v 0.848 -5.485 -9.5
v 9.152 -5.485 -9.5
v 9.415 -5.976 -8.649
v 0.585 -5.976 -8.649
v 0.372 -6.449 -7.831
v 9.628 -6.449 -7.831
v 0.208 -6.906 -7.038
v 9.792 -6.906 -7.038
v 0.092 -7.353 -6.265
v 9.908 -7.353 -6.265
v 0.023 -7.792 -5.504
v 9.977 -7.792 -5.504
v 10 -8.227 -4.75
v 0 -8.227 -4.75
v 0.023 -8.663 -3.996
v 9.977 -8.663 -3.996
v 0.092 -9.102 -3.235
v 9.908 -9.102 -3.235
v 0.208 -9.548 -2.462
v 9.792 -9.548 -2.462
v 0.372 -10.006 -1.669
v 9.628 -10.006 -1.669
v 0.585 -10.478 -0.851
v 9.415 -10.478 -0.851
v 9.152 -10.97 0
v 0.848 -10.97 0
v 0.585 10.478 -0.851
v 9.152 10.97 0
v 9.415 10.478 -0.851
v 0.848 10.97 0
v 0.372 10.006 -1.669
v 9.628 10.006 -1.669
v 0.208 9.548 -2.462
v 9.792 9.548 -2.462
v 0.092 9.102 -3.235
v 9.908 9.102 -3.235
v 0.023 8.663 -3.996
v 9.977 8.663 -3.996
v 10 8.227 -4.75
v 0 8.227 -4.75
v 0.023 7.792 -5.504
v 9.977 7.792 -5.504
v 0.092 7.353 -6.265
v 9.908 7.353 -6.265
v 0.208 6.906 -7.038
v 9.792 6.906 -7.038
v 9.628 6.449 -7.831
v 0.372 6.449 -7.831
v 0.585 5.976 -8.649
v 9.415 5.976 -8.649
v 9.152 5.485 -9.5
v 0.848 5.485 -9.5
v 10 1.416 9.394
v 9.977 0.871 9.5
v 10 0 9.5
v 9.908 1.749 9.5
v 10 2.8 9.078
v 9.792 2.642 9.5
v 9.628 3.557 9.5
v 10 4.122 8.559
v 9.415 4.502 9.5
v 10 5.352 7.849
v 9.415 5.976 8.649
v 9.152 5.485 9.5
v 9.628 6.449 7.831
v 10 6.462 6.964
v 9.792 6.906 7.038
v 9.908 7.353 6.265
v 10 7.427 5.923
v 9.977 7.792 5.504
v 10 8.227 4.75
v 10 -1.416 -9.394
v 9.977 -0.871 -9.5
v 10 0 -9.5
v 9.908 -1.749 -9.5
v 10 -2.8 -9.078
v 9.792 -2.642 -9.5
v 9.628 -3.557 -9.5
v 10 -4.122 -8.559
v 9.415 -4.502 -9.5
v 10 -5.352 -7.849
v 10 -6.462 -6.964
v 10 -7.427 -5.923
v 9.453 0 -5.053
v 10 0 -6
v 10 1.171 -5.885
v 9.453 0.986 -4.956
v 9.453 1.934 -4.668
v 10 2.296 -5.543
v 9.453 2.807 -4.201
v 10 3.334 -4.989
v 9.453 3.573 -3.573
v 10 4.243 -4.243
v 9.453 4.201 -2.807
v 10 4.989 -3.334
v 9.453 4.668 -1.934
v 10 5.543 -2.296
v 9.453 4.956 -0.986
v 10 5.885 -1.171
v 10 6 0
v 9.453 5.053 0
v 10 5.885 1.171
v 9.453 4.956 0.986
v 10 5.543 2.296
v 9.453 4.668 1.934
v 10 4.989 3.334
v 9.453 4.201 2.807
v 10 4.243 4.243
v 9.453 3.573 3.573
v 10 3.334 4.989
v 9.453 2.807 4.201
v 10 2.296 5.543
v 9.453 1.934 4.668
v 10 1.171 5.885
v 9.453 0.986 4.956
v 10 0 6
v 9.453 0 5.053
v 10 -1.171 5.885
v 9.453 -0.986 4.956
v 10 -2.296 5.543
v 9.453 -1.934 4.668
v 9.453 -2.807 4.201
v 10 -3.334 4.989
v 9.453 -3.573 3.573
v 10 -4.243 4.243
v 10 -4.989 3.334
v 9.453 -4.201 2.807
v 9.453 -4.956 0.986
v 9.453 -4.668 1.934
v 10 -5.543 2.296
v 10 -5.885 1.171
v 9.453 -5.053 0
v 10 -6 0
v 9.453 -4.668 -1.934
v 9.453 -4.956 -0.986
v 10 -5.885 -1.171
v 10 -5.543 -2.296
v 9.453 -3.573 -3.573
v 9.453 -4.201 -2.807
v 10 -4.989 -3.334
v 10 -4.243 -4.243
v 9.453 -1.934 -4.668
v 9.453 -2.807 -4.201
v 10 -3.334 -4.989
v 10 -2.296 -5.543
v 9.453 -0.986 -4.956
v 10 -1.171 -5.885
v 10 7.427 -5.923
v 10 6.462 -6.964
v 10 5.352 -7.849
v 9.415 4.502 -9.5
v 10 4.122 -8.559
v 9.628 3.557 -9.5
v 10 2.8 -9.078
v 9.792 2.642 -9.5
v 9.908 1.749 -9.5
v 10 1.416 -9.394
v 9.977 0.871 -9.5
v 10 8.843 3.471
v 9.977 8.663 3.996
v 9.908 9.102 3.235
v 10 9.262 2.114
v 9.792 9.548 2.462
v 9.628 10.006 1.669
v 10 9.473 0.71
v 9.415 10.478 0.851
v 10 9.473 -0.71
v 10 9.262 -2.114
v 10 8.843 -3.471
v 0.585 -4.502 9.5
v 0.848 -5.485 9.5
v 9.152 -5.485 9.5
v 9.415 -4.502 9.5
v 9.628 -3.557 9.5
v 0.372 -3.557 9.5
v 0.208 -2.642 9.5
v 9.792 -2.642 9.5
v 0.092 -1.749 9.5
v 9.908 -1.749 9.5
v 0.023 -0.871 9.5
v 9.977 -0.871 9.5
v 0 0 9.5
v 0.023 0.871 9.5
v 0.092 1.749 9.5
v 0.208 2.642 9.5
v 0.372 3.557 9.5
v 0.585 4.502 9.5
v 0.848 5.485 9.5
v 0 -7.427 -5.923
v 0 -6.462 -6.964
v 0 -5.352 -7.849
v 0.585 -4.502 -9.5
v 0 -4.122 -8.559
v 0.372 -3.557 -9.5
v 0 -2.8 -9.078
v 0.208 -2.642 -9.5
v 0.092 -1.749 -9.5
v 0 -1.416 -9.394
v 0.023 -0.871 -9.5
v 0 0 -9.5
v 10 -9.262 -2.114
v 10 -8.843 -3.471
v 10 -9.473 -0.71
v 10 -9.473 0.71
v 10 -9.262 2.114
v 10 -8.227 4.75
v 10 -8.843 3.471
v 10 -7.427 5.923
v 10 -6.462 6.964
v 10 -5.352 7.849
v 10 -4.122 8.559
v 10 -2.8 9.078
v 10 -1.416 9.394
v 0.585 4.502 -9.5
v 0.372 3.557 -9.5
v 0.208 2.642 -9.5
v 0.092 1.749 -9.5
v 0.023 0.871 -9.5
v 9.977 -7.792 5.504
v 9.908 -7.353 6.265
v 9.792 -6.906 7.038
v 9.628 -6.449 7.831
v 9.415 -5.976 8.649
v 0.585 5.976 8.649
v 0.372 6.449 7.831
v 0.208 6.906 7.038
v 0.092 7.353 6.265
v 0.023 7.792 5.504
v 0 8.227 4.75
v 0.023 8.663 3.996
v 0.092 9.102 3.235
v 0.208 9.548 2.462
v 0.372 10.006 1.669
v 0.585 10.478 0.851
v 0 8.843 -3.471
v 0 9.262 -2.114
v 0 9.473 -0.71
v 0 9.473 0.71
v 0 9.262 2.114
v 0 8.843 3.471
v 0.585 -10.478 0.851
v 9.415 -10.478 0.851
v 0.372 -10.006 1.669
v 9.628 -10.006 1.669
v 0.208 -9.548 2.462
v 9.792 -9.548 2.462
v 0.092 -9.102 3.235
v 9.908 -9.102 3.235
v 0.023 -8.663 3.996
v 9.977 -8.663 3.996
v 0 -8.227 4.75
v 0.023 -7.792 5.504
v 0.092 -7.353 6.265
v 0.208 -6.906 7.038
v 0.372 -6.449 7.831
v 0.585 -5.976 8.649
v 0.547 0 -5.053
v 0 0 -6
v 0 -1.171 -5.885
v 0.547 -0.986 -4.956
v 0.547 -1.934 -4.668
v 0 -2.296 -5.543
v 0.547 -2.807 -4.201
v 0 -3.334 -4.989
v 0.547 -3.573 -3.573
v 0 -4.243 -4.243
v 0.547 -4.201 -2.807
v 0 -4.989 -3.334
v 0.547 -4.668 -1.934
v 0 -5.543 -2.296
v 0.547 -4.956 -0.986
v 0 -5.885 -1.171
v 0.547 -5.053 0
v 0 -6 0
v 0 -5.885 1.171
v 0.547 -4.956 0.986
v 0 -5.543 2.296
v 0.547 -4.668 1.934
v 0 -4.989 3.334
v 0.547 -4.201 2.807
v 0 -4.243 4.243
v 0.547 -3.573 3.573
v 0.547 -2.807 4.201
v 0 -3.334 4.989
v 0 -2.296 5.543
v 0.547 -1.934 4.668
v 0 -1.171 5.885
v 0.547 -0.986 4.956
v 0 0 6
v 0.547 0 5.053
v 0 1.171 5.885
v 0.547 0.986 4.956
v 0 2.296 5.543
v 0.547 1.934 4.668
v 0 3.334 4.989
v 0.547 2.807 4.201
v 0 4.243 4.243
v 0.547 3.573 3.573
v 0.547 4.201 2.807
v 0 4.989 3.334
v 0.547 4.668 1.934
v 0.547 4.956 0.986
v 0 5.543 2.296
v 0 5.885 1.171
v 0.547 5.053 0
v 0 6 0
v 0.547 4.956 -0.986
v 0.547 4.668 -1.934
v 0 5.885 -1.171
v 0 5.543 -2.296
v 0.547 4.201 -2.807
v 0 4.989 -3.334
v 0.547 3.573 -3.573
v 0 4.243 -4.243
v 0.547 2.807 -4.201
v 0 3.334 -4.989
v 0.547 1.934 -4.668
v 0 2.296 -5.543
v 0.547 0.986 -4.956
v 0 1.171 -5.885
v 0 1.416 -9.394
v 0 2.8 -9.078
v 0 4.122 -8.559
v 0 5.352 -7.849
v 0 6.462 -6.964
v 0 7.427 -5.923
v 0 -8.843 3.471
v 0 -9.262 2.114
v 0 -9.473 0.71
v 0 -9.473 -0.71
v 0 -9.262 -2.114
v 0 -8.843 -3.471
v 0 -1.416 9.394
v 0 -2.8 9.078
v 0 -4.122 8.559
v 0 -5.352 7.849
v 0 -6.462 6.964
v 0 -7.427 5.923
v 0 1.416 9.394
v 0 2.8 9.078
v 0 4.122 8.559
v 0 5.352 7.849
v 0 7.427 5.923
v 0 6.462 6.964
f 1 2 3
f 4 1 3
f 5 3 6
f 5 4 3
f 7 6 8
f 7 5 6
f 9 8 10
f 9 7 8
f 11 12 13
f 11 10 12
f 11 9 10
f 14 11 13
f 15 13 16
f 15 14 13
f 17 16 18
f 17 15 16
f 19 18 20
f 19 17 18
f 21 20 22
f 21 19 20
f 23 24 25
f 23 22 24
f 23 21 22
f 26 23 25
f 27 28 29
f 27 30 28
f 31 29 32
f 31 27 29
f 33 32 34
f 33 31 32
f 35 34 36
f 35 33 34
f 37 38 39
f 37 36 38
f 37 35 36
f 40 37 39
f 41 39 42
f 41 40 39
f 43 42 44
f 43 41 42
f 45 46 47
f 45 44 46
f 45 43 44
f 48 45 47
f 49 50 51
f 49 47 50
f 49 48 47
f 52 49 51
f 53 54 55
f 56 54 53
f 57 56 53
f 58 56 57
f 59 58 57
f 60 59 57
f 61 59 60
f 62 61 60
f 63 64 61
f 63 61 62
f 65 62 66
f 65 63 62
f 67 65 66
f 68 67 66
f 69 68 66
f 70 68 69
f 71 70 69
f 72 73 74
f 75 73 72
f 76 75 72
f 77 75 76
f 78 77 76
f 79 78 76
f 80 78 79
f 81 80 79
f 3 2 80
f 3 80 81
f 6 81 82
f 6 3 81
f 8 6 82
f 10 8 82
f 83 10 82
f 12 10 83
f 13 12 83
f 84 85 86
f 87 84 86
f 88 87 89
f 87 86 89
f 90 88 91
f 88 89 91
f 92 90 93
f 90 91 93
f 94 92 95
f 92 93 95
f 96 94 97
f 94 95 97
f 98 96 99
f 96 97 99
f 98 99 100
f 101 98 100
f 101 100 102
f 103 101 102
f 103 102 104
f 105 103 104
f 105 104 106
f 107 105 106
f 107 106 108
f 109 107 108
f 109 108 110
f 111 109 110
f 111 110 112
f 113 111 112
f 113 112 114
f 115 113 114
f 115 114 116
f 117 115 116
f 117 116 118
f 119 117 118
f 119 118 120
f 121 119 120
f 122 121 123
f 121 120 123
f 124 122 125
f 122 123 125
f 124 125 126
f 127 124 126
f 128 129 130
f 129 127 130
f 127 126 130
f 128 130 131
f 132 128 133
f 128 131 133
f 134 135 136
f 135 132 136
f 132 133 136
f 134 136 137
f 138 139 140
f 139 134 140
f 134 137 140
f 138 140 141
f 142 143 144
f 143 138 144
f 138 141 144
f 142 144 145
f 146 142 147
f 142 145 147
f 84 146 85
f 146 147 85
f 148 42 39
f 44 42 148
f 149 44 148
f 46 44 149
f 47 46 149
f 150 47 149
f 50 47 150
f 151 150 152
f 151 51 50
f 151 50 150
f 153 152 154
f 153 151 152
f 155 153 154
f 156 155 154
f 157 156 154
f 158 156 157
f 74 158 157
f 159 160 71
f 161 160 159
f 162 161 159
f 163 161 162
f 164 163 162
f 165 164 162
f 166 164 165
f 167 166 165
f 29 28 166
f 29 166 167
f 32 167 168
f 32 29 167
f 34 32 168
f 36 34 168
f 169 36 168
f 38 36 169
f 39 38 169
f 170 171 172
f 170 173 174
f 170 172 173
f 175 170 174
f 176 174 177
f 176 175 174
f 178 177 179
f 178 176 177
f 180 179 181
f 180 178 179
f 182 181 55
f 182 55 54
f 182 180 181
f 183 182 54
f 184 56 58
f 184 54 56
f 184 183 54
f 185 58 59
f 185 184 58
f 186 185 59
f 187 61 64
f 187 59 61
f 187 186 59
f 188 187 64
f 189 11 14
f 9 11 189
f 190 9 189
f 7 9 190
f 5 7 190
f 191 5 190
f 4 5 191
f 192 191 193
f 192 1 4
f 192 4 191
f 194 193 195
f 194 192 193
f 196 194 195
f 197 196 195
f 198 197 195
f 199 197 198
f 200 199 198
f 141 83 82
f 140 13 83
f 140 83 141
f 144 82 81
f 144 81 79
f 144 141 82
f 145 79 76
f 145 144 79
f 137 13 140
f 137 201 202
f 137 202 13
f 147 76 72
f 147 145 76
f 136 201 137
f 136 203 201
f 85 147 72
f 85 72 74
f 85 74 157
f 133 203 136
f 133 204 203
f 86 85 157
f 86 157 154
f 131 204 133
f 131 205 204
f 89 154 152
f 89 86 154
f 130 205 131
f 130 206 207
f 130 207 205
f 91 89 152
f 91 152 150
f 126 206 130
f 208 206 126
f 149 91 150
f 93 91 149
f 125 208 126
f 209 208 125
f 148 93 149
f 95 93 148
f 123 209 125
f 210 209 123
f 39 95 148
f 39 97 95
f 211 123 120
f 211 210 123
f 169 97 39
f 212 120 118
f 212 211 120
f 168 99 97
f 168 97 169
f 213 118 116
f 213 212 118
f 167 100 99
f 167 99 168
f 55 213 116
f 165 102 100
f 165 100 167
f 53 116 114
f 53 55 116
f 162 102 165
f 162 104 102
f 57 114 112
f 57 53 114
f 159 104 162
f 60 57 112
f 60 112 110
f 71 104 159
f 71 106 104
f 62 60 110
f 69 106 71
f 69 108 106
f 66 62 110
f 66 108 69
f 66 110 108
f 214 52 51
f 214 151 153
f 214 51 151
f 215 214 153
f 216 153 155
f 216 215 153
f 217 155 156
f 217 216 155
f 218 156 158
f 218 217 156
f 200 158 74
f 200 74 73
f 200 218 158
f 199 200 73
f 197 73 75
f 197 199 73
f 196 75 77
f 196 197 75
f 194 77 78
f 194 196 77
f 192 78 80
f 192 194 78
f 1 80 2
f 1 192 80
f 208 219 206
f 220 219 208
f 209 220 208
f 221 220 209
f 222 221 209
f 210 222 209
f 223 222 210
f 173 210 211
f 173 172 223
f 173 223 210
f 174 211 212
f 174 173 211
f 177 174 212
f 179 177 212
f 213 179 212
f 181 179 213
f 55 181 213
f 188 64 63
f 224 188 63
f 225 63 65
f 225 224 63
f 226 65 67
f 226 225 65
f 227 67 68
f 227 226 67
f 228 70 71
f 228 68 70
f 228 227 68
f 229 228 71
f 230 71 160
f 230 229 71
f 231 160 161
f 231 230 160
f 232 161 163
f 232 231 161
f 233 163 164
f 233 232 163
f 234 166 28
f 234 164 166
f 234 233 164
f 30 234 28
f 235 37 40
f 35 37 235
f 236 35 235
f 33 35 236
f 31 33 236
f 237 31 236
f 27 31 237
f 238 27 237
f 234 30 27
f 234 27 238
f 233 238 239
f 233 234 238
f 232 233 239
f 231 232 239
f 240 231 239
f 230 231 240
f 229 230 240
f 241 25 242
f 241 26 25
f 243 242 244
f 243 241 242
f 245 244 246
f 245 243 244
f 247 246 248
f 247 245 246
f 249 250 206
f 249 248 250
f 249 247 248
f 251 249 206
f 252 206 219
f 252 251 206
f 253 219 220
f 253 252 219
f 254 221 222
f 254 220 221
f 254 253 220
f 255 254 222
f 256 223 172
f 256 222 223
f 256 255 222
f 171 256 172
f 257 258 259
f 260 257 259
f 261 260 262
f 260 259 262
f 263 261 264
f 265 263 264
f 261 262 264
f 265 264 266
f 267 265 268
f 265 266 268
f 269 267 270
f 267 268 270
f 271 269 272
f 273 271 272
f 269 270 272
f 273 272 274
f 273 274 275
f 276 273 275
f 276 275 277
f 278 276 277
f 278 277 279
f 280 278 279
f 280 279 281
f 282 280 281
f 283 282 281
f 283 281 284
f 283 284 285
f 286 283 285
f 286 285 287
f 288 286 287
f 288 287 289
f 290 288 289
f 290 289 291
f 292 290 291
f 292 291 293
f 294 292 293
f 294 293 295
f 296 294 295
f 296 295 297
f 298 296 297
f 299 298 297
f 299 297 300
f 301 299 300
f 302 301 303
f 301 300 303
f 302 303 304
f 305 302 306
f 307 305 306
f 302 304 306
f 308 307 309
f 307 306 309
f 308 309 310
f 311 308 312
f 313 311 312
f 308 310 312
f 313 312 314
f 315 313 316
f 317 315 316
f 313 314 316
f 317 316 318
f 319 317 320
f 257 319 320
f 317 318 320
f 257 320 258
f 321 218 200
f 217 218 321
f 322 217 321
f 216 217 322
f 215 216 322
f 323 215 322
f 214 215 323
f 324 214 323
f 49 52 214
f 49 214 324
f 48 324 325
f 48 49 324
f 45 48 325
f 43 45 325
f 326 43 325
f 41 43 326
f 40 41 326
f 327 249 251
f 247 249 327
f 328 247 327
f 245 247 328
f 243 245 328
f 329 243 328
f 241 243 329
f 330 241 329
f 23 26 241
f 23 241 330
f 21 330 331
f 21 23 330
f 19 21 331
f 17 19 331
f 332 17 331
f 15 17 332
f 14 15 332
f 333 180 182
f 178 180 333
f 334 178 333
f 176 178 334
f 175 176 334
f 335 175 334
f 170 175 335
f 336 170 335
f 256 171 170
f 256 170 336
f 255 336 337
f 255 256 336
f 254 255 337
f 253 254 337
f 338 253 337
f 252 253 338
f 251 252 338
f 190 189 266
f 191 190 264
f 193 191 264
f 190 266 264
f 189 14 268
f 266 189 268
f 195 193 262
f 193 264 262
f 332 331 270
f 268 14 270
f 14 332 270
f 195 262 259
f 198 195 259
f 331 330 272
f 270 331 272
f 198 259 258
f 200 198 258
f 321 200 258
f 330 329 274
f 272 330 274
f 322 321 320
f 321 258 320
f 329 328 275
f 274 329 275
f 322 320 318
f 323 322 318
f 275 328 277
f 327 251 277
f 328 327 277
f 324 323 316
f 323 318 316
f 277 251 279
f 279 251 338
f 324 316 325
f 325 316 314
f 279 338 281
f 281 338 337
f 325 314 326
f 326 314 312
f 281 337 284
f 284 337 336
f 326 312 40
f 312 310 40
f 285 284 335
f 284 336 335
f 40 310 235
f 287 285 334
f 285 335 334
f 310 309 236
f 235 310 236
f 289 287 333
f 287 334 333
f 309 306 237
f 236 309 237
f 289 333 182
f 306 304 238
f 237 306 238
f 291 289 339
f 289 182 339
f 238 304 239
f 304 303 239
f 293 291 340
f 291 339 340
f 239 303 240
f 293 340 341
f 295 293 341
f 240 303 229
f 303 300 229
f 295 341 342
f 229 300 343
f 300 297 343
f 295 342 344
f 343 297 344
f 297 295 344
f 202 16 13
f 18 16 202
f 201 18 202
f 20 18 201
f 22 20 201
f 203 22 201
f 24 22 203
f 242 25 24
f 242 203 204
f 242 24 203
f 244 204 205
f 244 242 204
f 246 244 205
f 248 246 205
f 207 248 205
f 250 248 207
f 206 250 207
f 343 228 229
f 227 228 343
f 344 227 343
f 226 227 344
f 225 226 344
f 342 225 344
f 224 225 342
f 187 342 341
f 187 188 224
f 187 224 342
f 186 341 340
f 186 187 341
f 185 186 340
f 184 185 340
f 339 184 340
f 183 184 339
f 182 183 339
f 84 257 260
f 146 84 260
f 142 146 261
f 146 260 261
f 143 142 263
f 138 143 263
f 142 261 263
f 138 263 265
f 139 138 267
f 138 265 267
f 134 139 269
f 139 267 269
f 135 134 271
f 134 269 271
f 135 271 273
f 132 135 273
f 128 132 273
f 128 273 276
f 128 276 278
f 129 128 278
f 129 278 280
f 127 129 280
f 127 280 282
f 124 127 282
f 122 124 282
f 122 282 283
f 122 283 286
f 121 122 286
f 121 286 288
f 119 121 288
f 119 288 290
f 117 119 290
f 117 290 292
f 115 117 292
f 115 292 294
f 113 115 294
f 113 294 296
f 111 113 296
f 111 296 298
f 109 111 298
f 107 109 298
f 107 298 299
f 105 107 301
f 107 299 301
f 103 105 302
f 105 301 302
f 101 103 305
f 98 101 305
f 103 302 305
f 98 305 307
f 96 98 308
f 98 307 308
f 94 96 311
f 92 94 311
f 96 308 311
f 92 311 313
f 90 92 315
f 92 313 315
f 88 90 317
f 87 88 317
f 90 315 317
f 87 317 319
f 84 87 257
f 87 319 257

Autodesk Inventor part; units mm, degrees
ref_plane "YZ Plane" through (0, 0, 0) normal (1, 0, 0) x (0, 1, 0)
ref_plane "XZ Plane" through (0, 0, 0) normal (0, 1, 0) x (-1, 0, 0)
sketch "Эскиз1" plane through (0, 0, 0) normal (1, 0, 0) x (0, 1, 0)
  line L0 (-10.9697, 0) -> (-5.4848, 9.5)
  line L1 (-5.4848, 9.5) -> (5.4848, 9.5)
  line L2 (5.4848, 9.5) -> (10.9697, 0)
  line L3 (10.9697, 0) -> (5.4848, -9.5)
  line L4 (5.4848, -9.5) -> (-5.4848, -9.5)
  line L5 (-5.4848, -9.5) -> (-10.9697, 0)
  point P0 (0, 0)
  point P1 (0, 0)
  dimension "d0" = 21.9393
extrude "Базовый элемент" add sketch "Эскиз1" along normal blind 10
sketch "Эскиз2" plane through (0, 0, 0) normal (0, 0, 1) x (1, 0, 0)
  line L0 (0, 5.4848) -> (0, 10.9697) projected
  line L1 (0, 10.9697) -> (10, 10.9697) projected
  line L2 (10, 5.4848) -> (10, 10.9697) projected
  line L3 (-2, 0) -> (12, 0) projected
  line L4 (0.8485, 10.9697) -> (0, 9.5)
  line L5 (9.1515, 10.9697) -> (10, 9.5)
  dimension "d3" = 30
  dimension "d4" = 30
  dimension "d5" = 19
  dimension "d6" = 19
revolve "Фаска1" cut sketch "Эскиз2" angle 360 about axis through (-10, 0, 0) along (1, 0, 0)
sketch "Эскиз3" plane through (10, 0, 0) normal (1, 0, 0) x (0, 0, -1)
  arc A0 (-4.75, -8.2272) -> (4.75, -8.2272) centre (0, 0) ccw projected
hole "Резьба" at (10, 0, 0) direction (-1, 0, 0) diameter 10.106 end through all thread size "M12x1.75" class "6H" standard "ISO Metric profile"
chamfer "Фаска2" distance 0.9472 angle 30 1 edges at (10, 0, 5.053) measured on face at (10, -7.9707, -0.203)
chamfer "Фаска3" distance 0.9472 angle 30 1 edges at (0, 0, 5.053) measured on face at (0, -7.9707, -0.203)
ref_plane "Work Plane1" through (-20.6974, 0, 0) normal (0, -0.866, -0.5) x (1, 0, 0)
equation "\"d0\" = 1.1547 * SW"
equation "\"d1\" = KOH"
equation "\"d3\" = ANG1"
equation "\"d4\" = ANG2"
equation "\"d5\" = SW0"
equation "\"d6\" = SW01"
equation "\"d8\" = -0.5 * GD1 + 0.5 * NND"
equation "\"d40\" = -0.5 * GD1 + 0.5 * NND"
equation "\"d10\" = -0.5 * GD1 + 0.5 * NND"
equation "\"d41\" = -0.5 * GD1 + 0.5 * NND"
equation "\"ANG1\" = 30deg"
equation "\"ANG2\" = 30deg"
equation "\"NND\" = 12"
equation "\"KOH\" = 10"
equation "\"SW\" = 19"
equation "\"SW0\" = 19"
equation "\"SW01\" = SW0"
equation "\"GUL\" = 0.541266 * PTC"
equation "\"LADI\" = 18.05"
equation "\"TOA\" = 30deg"
equation "\"FAWI\" = 30deg"
equation "\"PTC\" = 1.75"
equation "\"THREADDIA\" = 12"
equation "\"E0\" = 1.155 * SW"
equation "\"GAL\" = 0.541266 * PTC"
equation "\"GD1\" = 10.105569"
properties part number "Гайка M12-6H ГОСТ 5927-70" material "Сталь, мягкая"
